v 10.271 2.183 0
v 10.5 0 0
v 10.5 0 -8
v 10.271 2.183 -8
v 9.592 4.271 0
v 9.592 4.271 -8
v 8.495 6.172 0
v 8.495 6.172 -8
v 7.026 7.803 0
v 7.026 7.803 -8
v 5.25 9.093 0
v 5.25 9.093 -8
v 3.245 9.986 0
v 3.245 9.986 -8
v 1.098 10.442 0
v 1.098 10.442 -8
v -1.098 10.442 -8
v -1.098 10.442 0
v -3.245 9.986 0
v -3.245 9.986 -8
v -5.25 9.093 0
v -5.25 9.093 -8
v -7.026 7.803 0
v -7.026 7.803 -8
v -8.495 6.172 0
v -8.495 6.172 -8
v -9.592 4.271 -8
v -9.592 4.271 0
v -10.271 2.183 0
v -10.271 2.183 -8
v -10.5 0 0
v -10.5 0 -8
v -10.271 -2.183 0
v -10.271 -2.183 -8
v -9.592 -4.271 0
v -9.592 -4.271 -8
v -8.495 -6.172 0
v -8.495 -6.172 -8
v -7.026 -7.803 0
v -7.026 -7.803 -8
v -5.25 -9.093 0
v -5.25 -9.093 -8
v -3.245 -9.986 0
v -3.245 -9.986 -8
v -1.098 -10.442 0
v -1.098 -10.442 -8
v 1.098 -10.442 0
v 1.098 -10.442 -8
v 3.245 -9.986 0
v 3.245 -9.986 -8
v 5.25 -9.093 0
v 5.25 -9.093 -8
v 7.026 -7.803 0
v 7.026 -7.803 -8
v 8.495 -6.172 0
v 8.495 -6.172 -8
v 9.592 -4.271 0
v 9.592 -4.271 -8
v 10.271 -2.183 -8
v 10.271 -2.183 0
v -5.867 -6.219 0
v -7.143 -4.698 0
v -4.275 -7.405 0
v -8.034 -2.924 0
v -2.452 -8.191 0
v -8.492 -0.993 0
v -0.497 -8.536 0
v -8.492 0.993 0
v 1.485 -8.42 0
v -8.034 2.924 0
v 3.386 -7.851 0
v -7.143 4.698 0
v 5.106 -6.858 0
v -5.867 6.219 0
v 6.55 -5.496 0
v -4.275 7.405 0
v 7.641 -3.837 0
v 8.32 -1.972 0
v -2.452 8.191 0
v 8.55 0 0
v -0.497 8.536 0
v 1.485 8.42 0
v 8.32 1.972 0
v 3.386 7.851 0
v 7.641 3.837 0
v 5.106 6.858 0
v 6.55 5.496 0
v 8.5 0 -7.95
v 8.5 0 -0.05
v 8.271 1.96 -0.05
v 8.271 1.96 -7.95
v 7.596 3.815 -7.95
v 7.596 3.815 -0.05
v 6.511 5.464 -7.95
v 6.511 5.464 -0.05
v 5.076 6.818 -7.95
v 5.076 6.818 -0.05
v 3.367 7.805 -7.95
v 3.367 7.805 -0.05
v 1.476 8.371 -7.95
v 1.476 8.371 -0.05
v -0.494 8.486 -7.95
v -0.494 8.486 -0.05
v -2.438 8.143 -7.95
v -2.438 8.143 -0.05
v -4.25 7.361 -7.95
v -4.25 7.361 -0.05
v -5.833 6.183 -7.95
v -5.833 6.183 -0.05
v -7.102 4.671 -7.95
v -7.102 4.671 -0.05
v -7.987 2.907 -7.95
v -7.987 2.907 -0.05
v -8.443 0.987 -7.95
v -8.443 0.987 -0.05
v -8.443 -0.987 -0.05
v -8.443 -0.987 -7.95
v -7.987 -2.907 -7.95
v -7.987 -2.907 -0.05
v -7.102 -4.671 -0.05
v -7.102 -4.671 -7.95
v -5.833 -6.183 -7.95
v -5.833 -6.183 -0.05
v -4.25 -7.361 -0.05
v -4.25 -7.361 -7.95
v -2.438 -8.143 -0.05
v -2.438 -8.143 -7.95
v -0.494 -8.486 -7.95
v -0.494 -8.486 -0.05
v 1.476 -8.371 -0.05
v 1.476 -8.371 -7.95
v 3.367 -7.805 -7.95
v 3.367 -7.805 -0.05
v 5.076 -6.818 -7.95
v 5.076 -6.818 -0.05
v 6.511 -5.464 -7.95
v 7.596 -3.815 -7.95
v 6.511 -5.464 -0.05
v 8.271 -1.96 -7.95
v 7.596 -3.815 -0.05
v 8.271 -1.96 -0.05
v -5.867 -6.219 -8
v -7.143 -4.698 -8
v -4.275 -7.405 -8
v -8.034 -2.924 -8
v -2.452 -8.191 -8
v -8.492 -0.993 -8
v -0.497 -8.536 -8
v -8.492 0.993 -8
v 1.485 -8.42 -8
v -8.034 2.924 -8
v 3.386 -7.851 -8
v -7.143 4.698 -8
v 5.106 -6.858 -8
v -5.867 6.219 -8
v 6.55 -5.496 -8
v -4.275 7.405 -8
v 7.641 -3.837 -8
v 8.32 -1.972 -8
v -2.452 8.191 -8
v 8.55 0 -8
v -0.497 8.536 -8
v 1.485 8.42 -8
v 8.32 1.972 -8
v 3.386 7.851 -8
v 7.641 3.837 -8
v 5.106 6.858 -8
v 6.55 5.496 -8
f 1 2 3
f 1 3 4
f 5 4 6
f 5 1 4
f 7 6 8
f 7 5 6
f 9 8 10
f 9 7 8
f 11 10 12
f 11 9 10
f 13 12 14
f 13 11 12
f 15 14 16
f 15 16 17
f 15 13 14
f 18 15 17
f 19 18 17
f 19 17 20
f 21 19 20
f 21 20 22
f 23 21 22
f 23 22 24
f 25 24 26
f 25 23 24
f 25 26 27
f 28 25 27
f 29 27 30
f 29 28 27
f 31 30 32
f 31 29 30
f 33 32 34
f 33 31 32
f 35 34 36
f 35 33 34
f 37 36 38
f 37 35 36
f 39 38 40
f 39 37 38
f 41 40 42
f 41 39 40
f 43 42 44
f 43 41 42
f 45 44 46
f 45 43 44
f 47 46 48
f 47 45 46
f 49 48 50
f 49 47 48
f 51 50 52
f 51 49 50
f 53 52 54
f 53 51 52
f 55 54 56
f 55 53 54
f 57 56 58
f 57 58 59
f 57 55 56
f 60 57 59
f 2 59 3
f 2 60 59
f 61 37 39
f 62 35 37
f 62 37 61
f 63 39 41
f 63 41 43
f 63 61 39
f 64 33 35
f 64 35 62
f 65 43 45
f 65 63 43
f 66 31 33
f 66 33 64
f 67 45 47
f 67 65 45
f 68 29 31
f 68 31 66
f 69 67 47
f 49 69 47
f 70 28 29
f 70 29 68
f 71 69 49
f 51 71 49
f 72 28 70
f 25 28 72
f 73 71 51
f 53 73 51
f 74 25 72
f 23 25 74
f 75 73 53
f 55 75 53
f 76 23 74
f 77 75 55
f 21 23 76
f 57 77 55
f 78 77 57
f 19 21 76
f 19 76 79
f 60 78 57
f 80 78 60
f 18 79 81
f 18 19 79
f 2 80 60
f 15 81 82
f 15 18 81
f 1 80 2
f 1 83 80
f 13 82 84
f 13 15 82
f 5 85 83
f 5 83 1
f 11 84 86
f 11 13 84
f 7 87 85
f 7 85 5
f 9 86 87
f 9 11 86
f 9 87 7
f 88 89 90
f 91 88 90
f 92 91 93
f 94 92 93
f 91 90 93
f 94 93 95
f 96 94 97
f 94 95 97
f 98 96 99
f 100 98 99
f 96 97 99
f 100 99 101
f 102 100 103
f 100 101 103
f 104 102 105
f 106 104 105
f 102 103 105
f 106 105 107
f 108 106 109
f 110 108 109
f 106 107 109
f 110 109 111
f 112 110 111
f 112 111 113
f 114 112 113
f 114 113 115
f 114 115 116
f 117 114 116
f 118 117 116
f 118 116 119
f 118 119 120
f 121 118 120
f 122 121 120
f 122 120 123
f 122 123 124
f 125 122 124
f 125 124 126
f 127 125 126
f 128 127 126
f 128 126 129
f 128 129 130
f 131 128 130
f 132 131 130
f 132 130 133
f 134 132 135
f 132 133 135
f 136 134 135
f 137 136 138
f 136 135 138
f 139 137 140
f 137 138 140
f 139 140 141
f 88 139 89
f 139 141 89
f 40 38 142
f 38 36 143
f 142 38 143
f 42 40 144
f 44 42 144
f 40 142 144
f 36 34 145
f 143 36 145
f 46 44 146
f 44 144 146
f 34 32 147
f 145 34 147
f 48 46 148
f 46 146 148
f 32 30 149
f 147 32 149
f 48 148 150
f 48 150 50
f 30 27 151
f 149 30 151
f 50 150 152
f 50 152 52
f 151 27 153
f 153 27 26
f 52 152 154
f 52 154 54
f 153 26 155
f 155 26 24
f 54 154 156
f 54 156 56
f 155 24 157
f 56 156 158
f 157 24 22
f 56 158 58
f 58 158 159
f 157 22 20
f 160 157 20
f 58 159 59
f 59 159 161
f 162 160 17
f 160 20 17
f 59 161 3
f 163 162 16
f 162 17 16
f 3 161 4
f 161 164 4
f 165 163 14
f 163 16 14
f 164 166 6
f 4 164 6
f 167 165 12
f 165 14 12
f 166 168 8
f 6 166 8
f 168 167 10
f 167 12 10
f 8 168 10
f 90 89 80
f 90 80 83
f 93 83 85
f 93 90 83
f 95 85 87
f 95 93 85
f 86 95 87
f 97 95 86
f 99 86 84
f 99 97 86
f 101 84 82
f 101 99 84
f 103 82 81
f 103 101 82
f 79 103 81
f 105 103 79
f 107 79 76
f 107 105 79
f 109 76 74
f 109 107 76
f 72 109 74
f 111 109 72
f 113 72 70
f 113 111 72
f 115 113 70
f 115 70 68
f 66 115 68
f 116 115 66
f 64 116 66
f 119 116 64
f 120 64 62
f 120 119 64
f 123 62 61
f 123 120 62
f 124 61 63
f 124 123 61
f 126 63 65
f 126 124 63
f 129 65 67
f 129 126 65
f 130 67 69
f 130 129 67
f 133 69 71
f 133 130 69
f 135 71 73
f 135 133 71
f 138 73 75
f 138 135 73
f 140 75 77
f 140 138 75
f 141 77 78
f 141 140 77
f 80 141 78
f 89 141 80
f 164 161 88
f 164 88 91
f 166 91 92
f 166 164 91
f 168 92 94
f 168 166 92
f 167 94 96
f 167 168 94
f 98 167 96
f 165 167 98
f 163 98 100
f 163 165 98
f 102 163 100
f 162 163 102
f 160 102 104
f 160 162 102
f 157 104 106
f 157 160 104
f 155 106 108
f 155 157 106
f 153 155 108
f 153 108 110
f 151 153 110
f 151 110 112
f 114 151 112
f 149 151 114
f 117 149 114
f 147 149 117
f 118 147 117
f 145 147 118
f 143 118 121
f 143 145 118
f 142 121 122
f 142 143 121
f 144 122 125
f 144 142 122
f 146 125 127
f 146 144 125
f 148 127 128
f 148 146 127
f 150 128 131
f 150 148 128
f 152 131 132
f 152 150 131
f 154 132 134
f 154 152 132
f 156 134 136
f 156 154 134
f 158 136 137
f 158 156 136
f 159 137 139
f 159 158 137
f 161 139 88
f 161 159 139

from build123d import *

# Parameters (mm, degrees)
SKETCH2_R           = 10.5
BOSS_EXTRUDE1_DEPTH = 8
SKETCH3_R           = 8.5
CUT_EXTRUDE1_DEPTH  = 9
CHAMFER1_SIZE       = 0.05
CHAMFER2_SIZE       = 0.05


with BuildPart() as part:
    # Sketch2 → Boss-Extrude1 (new body)
    with BuildSketch(Plane.XY):
        Circle(SKETCH2_R)
    extrude(amount=-BOSS_EXTRUDE1_DEPTH)

    # Sketch3 → Cut-Extrude1 (cut, through all)
    with BuildSketch(Plane.XY):
        Circle(SKETCH3_R)
    extrude(amount=-CUT_EXTRUDE1_DEPTH, mode=Mode.SUBTRACT)

    # Chamfer1
    chamfer1_edges = [part.edges().sort_by_distance(p)[0] for p in [
        (-8.5, 0, 0),
    ]]
    chamfer(chamfer1_edges, length=CHAMFER1_SIZE)

    # Chamfer2
    chamfer2_edges = [part.edges().sort_by_distance(p)[0] for p in [
        (-8.5, 0, -8),
    ]]
    chamfer(chamfer2_edges, length=CHAMFER2_SIZE)


solid = part.part
